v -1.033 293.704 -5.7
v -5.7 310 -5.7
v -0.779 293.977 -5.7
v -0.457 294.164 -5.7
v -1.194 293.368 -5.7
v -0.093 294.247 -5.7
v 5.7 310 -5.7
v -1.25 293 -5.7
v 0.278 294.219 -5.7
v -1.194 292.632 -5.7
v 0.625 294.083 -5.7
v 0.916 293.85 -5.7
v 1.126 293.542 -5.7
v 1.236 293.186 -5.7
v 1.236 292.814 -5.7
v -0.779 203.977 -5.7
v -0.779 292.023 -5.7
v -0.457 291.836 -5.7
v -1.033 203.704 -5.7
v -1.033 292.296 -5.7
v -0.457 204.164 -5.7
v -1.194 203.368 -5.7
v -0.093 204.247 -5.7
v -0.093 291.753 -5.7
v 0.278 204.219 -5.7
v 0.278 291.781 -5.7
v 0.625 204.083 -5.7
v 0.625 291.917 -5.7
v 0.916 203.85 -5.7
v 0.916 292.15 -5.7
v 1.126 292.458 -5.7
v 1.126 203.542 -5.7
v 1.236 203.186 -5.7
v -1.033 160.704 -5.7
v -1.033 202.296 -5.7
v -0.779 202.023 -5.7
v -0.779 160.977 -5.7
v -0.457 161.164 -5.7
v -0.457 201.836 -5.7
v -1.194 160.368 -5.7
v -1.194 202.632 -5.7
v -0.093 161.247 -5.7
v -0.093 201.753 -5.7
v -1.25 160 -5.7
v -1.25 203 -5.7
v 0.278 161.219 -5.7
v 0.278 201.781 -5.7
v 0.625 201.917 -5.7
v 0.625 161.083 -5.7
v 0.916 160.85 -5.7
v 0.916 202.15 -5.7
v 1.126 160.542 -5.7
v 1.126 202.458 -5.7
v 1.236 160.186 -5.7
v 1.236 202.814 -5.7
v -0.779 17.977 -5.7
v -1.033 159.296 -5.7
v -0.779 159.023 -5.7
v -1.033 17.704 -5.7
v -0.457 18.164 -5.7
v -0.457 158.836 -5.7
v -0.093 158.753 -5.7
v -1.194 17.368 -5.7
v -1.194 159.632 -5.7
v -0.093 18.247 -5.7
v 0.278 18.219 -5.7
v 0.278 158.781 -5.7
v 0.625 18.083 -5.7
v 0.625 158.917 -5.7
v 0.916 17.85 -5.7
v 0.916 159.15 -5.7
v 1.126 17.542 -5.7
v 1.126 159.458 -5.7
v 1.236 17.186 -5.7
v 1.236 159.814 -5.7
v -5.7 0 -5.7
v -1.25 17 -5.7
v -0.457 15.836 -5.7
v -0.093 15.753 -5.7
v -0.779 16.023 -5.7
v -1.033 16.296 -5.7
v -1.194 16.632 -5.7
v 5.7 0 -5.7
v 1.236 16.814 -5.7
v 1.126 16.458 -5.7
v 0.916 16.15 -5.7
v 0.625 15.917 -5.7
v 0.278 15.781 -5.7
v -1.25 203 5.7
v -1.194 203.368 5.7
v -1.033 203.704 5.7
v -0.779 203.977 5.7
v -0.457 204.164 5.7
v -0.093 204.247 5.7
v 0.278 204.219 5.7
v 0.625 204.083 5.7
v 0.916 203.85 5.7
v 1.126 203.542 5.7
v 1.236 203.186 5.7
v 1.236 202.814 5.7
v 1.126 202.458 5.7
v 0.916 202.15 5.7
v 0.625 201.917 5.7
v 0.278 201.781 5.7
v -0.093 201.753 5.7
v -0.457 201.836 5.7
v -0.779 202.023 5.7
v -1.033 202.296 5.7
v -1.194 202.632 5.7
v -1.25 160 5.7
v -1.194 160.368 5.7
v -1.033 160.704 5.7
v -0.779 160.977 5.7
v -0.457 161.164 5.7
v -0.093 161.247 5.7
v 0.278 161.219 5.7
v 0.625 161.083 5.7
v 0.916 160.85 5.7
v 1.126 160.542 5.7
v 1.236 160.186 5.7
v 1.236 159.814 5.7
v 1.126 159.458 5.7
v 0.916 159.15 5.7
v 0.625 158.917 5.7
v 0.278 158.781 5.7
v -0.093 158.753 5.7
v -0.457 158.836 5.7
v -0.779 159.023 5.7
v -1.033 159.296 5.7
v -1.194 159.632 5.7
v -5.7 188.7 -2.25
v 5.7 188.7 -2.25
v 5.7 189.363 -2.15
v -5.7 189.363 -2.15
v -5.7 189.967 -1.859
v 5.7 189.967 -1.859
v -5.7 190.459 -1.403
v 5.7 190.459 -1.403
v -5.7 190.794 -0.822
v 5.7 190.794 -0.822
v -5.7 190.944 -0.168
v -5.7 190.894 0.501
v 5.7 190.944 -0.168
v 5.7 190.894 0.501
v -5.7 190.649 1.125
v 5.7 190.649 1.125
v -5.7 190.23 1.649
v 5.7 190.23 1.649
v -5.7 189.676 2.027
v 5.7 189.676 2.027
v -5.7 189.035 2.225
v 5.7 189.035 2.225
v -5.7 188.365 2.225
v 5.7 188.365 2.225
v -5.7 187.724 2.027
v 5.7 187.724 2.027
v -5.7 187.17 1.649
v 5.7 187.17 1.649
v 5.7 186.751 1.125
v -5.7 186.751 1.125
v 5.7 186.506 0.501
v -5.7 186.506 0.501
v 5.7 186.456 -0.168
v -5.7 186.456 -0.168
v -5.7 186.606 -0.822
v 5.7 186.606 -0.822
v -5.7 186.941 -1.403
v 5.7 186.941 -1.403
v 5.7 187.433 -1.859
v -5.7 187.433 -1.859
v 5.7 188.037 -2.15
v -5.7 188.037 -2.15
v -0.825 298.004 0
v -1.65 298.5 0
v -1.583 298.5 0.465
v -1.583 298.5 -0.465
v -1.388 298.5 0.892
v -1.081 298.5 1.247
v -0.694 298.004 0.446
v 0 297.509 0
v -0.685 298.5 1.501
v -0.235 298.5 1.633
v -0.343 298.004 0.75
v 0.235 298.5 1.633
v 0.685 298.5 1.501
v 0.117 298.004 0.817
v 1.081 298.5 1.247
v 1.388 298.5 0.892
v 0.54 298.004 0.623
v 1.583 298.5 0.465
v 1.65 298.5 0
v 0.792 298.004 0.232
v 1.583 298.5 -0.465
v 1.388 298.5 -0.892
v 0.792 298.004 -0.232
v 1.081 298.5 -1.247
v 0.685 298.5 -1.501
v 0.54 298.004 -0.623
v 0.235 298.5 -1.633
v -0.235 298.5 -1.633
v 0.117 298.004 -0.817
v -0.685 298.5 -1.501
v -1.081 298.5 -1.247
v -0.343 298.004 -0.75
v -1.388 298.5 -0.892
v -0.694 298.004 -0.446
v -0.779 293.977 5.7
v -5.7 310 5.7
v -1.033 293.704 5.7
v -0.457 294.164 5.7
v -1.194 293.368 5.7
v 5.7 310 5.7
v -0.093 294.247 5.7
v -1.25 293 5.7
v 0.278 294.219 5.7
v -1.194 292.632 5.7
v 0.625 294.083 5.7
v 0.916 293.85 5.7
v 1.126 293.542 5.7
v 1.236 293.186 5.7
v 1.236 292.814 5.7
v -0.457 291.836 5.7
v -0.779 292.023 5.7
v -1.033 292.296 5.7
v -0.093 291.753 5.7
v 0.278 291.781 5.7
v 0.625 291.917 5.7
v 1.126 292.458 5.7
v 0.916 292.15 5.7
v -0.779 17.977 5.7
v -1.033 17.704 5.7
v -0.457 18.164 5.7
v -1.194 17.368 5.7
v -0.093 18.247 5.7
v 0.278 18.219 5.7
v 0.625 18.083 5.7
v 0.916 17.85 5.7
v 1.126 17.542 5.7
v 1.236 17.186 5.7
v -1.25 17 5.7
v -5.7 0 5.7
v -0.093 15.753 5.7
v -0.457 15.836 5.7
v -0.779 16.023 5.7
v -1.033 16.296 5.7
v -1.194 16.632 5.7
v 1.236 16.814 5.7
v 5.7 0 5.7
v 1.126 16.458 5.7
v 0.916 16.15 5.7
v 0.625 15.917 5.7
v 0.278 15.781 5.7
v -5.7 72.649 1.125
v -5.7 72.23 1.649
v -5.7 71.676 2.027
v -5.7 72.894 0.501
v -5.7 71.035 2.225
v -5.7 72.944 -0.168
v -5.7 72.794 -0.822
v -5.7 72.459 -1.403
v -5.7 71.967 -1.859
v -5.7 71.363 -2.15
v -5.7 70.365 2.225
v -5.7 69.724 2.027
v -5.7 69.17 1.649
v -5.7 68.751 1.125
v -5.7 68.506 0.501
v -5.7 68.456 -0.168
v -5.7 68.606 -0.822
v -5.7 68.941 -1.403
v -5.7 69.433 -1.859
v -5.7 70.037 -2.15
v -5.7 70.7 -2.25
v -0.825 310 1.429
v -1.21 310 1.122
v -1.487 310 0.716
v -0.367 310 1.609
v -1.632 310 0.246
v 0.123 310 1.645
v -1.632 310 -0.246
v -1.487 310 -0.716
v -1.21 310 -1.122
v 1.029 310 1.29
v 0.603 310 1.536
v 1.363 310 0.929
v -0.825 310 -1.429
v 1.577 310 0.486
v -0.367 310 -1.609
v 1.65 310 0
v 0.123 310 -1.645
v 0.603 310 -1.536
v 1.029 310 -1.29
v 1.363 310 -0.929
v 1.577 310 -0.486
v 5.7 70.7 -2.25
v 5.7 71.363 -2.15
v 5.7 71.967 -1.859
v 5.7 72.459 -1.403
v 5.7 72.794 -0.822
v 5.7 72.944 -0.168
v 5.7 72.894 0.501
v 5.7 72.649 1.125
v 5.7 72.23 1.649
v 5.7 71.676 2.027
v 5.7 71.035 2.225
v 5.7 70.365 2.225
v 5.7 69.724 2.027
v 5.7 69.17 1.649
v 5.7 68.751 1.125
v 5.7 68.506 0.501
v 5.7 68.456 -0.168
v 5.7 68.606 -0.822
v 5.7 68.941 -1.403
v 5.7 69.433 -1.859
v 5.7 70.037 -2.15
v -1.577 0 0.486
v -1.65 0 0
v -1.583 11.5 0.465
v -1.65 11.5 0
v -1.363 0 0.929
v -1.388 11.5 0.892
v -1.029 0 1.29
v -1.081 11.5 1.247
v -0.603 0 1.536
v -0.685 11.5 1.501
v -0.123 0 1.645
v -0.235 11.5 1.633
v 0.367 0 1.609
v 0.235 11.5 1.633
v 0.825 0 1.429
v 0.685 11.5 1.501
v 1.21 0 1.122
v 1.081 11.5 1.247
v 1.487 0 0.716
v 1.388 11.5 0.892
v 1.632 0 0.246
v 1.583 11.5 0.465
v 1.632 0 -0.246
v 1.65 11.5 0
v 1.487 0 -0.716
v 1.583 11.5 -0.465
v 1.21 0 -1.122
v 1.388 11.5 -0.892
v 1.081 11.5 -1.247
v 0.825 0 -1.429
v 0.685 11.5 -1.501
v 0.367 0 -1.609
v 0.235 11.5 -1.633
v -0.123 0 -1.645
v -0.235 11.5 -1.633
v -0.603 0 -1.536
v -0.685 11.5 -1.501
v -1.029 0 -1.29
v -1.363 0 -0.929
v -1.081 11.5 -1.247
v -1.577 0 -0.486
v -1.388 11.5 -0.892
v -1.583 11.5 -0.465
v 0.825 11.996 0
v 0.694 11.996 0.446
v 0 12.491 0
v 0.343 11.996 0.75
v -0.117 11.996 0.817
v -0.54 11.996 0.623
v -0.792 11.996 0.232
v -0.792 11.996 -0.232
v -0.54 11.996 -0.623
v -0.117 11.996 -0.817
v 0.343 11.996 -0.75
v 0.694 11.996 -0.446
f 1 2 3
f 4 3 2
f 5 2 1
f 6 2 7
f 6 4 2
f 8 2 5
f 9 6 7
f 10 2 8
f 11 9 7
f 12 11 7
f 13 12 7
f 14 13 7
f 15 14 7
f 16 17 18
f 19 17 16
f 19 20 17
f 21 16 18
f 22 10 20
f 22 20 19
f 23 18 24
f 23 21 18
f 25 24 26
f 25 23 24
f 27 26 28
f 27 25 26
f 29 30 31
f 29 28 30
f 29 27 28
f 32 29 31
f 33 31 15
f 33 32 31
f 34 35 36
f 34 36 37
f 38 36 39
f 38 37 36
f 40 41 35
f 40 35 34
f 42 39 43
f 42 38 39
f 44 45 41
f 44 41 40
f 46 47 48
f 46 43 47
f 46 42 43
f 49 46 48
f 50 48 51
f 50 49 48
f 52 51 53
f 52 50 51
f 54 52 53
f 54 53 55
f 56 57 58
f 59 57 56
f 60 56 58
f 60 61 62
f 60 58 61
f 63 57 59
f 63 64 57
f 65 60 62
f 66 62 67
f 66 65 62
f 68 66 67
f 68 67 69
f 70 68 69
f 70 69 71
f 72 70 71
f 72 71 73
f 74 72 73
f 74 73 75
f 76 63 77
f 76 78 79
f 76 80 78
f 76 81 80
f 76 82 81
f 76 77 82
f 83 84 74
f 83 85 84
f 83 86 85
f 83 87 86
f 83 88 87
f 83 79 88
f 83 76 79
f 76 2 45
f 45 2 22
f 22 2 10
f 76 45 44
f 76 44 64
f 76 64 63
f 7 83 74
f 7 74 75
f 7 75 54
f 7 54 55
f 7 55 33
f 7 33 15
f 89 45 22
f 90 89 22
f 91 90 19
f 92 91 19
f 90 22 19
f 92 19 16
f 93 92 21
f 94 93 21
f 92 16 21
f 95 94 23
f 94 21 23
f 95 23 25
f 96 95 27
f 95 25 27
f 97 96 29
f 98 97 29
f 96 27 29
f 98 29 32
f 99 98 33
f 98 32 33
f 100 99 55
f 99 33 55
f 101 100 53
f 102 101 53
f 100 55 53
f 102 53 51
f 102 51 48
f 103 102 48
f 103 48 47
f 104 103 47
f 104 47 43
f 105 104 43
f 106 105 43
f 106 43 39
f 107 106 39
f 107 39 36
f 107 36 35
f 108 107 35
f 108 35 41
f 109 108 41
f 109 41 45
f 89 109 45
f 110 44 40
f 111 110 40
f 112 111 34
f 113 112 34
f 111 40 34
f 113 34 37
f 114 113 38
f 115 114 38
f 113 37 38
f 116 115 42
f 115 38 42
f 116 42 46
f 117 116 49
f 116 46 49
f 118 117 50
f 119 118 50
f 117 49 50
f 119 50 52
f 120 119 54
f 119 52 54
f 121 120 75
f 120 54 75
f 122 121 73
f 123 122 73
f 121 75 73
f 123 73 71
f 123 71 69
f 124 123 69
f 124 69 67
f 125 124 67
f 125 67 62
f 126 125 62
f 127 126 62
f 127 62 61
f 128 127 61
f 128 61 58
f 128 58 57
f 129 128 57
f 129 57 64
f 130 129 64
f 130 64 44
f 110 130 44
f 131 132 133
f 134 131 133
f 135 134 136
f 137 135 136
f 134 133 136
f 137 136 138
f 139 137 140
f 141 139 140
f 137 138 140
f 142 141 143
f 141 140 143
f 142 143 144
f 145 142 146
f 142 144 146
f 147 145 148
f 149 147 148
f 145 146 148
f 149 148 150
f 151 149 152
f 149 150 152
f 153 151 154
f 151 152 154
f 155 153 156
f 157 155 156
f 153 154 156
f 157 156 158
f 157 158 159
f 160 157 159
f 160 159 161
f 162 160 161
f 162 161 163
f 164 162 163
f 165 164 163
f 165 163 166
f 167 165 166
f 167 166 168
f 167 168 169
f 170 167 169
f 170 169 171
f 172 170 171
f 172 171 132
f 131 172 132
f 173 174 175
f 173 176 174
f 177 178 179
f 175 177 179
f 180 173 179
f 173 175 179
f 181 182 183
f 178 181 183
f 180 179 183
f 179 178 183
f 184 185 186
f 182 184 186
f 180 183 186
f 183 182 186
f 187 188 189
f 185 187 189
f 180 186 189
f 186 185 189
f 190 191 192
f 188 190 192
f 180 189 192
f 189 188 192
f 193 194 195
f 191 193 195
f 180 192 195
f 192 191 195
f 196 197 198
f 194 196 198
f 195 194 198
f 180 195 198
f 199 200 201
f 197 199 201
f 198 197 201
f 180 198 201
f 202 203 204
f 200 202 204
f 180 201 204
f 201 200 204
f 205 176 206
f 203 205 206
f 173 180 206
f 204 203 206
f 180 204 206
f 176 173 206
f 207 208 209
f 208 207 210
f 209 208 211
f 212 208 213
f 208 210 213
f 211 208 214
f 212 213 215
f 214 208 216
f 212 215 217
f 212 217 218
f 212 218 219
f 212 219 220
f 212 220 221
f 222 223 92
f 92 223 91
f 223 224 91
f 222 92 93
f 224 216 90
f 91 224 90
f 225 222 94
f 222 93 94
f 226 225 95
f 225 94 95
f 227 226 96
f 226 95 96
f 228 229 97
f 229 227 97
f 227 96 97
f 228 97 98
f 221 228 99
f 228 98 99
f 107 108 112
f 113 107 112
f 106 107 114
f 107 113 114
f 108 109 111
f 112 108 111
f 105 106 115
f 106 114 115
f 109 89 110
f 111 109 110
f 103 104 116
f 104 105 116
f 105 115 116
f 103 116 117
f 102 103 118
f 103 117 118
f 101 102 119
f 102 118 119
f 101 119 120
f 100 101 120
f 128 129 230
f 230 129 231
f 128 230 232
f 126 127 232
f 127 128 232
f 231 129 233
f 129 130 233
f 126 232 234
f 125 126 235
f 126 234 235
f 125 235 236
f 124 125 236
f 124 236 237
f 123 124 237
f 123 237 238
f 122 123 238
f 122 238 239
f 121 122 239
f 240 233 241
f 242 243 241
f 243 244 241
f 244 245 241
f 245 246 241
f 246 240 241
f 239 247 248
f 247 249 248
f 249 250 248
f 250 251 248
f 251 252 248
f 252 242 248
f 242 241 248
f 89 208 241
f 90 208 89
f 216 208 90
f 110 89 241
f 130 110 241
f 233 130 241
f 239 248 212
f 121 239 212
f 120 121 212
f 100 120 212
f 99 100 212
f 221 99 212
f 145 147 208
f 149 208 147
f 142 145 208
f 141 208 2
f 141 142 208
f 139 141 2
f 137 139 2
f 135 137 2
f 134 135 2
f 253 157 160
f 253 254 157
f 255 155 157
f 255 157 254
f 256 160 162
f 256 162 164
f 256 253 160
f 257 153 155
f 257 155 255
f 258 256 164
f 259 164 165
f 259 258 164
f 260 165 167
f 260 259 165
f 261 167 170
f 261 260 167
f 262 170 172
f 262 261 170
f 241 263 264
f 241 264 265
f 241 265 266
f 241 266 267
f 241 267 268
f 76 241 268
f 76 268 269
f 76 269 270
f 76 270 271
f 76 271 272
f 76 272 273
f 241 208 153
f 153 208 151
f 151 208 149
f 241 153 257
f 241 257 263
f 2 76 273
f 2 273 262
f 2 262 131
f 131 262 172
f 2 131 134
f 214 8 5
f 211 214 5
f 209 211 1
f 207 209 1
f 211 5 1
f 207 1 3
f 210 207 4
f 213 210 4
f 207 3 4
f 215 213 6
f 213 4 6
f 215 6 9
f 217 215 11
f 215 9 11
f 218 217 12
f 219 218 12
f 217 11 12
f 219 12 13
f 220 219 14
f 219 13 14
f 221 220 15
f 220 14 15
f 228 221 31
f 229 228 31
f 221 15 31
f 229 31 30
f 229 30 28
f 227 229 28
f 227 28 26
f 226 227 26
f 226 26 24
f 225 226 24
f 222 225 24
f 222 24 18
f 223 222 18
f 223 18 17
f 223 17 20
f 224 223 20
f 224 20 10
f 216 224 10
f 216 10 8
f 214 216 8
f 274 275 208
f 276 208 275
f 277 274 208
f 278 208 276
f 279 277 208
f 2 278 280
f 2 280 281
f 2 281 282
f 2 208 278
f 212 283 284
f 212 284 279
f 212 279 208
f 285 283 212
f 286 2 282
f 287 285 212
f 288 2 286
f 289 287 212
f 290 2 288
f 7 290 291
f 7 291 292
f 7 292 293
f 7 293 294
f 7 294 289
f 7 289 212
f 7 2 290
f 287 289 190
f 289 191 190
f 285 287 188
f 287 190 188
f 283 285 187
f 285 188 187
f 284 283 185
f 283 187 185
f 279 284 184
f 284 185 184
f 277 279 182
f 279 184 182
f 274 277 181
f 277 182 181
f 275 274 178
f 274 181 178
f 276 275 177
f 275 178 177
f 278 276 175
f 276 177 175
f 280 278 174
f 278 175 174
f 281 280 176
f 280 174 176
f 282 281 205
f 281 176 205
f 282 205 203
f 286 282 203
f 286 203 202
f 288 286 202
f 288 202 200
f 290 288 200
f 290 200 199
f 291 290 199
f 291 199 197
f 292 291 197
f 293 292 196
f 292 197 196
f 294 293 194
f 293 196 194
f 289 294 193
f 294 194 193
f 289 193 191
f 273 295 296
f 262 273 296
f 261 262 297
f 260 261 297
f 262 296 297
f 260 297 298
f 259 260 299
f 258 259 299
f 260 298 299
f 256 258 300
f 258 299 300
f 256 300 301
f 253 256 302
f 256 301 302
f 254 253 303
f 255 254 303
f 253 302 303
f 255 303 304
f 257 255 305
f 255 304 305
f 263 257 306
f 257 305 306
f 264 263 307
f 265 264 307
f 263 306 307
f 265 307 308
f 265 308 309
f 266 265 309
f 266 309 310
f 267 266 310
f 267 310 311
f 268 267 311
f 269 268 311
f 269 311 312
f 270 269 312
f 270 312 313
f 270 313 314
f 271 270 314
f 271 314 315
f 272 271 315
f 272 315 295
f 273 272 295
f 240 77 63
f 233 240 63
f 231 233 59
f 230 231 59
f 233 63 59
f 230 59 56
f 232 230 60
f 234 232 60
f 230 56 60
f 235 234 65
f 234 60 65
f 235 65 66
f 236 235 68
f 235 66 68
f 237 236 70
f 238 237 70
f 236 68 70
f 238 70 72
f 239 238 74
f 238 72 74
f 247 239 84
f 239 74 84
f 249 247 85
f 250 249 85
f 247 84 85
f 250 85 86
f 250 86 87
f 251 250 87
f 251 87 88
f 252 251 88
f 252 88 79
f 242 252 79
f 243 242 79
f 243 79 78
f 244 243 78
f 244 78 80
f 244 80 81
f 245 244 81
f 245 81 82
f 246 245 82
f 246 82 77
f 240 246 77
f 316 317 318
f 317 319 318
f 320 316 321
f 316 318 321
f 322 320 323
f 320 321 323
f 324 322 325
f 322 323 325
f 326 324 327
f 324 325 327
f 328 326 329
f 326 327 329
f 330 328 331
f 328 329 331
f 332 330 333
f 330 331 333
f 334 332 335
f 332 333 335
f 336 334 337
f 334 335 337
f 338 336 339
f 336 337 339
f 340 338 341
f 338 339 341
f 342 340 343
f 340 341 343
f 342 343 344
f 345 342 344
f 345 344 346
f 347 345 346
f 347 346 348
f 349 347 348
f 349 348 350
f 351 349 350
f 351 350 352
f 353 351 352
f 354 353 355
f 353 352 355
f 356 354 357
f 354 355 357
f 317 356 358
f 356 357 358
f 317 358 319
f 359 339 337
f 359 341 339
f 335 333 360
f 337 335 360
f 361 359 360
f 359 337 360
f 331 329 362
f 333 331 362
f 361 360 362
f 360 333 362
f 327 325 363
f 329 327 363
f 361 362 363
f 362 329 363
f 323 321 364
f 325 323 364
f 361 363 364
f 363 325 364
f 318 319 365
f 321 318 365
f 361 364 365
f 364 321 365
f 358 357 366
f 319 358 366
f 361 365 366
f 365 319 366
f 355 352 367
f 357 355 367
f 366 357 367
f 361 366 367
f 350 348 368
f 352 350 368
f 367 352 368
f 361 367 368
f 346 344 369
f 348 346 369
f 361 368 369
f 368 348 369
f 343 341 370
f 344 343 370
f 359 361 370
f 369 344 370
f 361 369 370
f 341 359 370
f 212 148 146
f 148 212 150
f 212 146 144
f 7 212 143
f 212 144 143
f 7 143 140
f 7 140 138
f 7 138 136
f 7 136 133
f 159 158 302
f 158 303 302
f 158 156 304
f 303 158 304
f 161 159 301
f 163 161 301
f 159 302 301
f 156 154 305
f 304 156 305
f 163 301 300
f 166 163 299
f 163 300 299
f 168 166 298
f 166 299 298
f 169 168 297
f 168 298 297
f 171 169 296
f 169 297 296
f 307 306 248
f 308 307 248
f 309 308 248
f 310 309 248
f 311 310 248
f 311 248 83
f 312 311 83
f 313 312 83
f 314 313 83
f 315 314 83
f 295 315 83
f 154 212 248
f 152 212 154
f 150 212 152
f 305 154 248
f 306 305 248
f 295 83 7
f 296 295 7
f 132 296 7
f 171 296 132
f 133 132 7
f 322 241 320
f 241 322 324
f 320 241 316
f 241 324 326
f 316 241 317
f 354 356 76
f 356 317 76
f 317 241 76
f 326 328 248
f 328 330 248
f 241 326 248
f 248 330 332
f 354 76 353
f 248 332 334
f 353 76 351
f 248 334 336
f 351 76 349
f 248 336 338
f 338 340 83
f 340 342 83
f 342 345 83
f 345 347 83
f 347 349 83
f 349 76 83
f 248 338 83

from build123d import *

# Parameters (mm, degrees)
ESQUISSE1_W           = 11.4
ESQUISSE1_H           = 11.4
BOSS_EXTRU_1_DEPTH    = 310
TROU_TARAUD_M31_D     = 2.5
TROU_TARAUD_M41_D     = 3.3
TROU_TARAUD_M41_DEPTH = 11.5
TROU_TARAUD_M41_TIP   = 0.991420021
TROU_TARAUD_M42_D     = 3.3
TROU_TARAUD_M42_DEPTH = 11.5
TROU_TARAUD_M42_TIP   = 0.991420021
D_GAGEMENT_M41_D      = 4.5
D_GAGEMENT_M42_D      = 4.5


with BuildPart() as part:
    # Esquisse1 → Boss.-Extru.1 (new body)
    with BuildSketch(Plane(origin=(0, 0, 0), x_dir=(1, 0, 0), z_dir=(0, 1, 0))):
        Rectangle(ESQUISSE1_W, ESQUISSE1_H)
    extrude(amount=BOSS_EXTRU_1_DEPTH)

    # Trou taraudé M31 (through all)
    with Locations(Plane.XY.offset(5.7)):
        with Locations((0, 293), (0, 17), (0, 160), (0, 203)):
            Hole(TROU_TARAUD_M31_D / 2)

    # Trou taraudé M41
    with Locations(Plane(origin=(0, 310, 0), x_dir=(-1, 0, 0), z_dir=(0, 1, 0))):
        with Locations((0, 0)):
            Hole(TROU_TARAUD_M41_D / 2, depth=TROU_TARAUD_M41_DEPTH)
            with Locations((0, 0, -(TROU_TARAUD_M41_DEPTH + TROU_TARAUD_M41_TIP / 2))):  # 118° drill point
                Cone(0, TROU_TARAUD_M41_D / 2, TROU_TARAUD_M41_TIP, mode=Mode.SUBTRACT)

    # Trou taraudé M42
    with Locations(Plane.XZ):
        with Locations((0, 0)):
            Hole(TROU_TARAUD_M42_D / 2, depth=TROU_TARAUD_M42_DEPTH)
            with Locations((0, 0, -(TROU_TARAUD_M42_DEPTH + TROU_TARAUD_M42_TIP / 2))):  # 118° drill point
                Cone(0, TROU_TARAUD_M42_D / 2, TROU_TARAUD_M42_TIP, mode=Mode.SUBTRACT)

    # Dégagement M41 (through all)
    with Locations(Plane.ZY.offset(5.7)):
        with Locations((0, 70.7)):
            Hole(D_GAGEMENT_M41_D / 2)

    # Dégagement M42 (through all)
    with Locations(Plane.ZY.offset(5.7)):
        with Locations((0, 188.7)):
            Hole(D_GAGEMENT_M42_D / 2)


solid = part.part
